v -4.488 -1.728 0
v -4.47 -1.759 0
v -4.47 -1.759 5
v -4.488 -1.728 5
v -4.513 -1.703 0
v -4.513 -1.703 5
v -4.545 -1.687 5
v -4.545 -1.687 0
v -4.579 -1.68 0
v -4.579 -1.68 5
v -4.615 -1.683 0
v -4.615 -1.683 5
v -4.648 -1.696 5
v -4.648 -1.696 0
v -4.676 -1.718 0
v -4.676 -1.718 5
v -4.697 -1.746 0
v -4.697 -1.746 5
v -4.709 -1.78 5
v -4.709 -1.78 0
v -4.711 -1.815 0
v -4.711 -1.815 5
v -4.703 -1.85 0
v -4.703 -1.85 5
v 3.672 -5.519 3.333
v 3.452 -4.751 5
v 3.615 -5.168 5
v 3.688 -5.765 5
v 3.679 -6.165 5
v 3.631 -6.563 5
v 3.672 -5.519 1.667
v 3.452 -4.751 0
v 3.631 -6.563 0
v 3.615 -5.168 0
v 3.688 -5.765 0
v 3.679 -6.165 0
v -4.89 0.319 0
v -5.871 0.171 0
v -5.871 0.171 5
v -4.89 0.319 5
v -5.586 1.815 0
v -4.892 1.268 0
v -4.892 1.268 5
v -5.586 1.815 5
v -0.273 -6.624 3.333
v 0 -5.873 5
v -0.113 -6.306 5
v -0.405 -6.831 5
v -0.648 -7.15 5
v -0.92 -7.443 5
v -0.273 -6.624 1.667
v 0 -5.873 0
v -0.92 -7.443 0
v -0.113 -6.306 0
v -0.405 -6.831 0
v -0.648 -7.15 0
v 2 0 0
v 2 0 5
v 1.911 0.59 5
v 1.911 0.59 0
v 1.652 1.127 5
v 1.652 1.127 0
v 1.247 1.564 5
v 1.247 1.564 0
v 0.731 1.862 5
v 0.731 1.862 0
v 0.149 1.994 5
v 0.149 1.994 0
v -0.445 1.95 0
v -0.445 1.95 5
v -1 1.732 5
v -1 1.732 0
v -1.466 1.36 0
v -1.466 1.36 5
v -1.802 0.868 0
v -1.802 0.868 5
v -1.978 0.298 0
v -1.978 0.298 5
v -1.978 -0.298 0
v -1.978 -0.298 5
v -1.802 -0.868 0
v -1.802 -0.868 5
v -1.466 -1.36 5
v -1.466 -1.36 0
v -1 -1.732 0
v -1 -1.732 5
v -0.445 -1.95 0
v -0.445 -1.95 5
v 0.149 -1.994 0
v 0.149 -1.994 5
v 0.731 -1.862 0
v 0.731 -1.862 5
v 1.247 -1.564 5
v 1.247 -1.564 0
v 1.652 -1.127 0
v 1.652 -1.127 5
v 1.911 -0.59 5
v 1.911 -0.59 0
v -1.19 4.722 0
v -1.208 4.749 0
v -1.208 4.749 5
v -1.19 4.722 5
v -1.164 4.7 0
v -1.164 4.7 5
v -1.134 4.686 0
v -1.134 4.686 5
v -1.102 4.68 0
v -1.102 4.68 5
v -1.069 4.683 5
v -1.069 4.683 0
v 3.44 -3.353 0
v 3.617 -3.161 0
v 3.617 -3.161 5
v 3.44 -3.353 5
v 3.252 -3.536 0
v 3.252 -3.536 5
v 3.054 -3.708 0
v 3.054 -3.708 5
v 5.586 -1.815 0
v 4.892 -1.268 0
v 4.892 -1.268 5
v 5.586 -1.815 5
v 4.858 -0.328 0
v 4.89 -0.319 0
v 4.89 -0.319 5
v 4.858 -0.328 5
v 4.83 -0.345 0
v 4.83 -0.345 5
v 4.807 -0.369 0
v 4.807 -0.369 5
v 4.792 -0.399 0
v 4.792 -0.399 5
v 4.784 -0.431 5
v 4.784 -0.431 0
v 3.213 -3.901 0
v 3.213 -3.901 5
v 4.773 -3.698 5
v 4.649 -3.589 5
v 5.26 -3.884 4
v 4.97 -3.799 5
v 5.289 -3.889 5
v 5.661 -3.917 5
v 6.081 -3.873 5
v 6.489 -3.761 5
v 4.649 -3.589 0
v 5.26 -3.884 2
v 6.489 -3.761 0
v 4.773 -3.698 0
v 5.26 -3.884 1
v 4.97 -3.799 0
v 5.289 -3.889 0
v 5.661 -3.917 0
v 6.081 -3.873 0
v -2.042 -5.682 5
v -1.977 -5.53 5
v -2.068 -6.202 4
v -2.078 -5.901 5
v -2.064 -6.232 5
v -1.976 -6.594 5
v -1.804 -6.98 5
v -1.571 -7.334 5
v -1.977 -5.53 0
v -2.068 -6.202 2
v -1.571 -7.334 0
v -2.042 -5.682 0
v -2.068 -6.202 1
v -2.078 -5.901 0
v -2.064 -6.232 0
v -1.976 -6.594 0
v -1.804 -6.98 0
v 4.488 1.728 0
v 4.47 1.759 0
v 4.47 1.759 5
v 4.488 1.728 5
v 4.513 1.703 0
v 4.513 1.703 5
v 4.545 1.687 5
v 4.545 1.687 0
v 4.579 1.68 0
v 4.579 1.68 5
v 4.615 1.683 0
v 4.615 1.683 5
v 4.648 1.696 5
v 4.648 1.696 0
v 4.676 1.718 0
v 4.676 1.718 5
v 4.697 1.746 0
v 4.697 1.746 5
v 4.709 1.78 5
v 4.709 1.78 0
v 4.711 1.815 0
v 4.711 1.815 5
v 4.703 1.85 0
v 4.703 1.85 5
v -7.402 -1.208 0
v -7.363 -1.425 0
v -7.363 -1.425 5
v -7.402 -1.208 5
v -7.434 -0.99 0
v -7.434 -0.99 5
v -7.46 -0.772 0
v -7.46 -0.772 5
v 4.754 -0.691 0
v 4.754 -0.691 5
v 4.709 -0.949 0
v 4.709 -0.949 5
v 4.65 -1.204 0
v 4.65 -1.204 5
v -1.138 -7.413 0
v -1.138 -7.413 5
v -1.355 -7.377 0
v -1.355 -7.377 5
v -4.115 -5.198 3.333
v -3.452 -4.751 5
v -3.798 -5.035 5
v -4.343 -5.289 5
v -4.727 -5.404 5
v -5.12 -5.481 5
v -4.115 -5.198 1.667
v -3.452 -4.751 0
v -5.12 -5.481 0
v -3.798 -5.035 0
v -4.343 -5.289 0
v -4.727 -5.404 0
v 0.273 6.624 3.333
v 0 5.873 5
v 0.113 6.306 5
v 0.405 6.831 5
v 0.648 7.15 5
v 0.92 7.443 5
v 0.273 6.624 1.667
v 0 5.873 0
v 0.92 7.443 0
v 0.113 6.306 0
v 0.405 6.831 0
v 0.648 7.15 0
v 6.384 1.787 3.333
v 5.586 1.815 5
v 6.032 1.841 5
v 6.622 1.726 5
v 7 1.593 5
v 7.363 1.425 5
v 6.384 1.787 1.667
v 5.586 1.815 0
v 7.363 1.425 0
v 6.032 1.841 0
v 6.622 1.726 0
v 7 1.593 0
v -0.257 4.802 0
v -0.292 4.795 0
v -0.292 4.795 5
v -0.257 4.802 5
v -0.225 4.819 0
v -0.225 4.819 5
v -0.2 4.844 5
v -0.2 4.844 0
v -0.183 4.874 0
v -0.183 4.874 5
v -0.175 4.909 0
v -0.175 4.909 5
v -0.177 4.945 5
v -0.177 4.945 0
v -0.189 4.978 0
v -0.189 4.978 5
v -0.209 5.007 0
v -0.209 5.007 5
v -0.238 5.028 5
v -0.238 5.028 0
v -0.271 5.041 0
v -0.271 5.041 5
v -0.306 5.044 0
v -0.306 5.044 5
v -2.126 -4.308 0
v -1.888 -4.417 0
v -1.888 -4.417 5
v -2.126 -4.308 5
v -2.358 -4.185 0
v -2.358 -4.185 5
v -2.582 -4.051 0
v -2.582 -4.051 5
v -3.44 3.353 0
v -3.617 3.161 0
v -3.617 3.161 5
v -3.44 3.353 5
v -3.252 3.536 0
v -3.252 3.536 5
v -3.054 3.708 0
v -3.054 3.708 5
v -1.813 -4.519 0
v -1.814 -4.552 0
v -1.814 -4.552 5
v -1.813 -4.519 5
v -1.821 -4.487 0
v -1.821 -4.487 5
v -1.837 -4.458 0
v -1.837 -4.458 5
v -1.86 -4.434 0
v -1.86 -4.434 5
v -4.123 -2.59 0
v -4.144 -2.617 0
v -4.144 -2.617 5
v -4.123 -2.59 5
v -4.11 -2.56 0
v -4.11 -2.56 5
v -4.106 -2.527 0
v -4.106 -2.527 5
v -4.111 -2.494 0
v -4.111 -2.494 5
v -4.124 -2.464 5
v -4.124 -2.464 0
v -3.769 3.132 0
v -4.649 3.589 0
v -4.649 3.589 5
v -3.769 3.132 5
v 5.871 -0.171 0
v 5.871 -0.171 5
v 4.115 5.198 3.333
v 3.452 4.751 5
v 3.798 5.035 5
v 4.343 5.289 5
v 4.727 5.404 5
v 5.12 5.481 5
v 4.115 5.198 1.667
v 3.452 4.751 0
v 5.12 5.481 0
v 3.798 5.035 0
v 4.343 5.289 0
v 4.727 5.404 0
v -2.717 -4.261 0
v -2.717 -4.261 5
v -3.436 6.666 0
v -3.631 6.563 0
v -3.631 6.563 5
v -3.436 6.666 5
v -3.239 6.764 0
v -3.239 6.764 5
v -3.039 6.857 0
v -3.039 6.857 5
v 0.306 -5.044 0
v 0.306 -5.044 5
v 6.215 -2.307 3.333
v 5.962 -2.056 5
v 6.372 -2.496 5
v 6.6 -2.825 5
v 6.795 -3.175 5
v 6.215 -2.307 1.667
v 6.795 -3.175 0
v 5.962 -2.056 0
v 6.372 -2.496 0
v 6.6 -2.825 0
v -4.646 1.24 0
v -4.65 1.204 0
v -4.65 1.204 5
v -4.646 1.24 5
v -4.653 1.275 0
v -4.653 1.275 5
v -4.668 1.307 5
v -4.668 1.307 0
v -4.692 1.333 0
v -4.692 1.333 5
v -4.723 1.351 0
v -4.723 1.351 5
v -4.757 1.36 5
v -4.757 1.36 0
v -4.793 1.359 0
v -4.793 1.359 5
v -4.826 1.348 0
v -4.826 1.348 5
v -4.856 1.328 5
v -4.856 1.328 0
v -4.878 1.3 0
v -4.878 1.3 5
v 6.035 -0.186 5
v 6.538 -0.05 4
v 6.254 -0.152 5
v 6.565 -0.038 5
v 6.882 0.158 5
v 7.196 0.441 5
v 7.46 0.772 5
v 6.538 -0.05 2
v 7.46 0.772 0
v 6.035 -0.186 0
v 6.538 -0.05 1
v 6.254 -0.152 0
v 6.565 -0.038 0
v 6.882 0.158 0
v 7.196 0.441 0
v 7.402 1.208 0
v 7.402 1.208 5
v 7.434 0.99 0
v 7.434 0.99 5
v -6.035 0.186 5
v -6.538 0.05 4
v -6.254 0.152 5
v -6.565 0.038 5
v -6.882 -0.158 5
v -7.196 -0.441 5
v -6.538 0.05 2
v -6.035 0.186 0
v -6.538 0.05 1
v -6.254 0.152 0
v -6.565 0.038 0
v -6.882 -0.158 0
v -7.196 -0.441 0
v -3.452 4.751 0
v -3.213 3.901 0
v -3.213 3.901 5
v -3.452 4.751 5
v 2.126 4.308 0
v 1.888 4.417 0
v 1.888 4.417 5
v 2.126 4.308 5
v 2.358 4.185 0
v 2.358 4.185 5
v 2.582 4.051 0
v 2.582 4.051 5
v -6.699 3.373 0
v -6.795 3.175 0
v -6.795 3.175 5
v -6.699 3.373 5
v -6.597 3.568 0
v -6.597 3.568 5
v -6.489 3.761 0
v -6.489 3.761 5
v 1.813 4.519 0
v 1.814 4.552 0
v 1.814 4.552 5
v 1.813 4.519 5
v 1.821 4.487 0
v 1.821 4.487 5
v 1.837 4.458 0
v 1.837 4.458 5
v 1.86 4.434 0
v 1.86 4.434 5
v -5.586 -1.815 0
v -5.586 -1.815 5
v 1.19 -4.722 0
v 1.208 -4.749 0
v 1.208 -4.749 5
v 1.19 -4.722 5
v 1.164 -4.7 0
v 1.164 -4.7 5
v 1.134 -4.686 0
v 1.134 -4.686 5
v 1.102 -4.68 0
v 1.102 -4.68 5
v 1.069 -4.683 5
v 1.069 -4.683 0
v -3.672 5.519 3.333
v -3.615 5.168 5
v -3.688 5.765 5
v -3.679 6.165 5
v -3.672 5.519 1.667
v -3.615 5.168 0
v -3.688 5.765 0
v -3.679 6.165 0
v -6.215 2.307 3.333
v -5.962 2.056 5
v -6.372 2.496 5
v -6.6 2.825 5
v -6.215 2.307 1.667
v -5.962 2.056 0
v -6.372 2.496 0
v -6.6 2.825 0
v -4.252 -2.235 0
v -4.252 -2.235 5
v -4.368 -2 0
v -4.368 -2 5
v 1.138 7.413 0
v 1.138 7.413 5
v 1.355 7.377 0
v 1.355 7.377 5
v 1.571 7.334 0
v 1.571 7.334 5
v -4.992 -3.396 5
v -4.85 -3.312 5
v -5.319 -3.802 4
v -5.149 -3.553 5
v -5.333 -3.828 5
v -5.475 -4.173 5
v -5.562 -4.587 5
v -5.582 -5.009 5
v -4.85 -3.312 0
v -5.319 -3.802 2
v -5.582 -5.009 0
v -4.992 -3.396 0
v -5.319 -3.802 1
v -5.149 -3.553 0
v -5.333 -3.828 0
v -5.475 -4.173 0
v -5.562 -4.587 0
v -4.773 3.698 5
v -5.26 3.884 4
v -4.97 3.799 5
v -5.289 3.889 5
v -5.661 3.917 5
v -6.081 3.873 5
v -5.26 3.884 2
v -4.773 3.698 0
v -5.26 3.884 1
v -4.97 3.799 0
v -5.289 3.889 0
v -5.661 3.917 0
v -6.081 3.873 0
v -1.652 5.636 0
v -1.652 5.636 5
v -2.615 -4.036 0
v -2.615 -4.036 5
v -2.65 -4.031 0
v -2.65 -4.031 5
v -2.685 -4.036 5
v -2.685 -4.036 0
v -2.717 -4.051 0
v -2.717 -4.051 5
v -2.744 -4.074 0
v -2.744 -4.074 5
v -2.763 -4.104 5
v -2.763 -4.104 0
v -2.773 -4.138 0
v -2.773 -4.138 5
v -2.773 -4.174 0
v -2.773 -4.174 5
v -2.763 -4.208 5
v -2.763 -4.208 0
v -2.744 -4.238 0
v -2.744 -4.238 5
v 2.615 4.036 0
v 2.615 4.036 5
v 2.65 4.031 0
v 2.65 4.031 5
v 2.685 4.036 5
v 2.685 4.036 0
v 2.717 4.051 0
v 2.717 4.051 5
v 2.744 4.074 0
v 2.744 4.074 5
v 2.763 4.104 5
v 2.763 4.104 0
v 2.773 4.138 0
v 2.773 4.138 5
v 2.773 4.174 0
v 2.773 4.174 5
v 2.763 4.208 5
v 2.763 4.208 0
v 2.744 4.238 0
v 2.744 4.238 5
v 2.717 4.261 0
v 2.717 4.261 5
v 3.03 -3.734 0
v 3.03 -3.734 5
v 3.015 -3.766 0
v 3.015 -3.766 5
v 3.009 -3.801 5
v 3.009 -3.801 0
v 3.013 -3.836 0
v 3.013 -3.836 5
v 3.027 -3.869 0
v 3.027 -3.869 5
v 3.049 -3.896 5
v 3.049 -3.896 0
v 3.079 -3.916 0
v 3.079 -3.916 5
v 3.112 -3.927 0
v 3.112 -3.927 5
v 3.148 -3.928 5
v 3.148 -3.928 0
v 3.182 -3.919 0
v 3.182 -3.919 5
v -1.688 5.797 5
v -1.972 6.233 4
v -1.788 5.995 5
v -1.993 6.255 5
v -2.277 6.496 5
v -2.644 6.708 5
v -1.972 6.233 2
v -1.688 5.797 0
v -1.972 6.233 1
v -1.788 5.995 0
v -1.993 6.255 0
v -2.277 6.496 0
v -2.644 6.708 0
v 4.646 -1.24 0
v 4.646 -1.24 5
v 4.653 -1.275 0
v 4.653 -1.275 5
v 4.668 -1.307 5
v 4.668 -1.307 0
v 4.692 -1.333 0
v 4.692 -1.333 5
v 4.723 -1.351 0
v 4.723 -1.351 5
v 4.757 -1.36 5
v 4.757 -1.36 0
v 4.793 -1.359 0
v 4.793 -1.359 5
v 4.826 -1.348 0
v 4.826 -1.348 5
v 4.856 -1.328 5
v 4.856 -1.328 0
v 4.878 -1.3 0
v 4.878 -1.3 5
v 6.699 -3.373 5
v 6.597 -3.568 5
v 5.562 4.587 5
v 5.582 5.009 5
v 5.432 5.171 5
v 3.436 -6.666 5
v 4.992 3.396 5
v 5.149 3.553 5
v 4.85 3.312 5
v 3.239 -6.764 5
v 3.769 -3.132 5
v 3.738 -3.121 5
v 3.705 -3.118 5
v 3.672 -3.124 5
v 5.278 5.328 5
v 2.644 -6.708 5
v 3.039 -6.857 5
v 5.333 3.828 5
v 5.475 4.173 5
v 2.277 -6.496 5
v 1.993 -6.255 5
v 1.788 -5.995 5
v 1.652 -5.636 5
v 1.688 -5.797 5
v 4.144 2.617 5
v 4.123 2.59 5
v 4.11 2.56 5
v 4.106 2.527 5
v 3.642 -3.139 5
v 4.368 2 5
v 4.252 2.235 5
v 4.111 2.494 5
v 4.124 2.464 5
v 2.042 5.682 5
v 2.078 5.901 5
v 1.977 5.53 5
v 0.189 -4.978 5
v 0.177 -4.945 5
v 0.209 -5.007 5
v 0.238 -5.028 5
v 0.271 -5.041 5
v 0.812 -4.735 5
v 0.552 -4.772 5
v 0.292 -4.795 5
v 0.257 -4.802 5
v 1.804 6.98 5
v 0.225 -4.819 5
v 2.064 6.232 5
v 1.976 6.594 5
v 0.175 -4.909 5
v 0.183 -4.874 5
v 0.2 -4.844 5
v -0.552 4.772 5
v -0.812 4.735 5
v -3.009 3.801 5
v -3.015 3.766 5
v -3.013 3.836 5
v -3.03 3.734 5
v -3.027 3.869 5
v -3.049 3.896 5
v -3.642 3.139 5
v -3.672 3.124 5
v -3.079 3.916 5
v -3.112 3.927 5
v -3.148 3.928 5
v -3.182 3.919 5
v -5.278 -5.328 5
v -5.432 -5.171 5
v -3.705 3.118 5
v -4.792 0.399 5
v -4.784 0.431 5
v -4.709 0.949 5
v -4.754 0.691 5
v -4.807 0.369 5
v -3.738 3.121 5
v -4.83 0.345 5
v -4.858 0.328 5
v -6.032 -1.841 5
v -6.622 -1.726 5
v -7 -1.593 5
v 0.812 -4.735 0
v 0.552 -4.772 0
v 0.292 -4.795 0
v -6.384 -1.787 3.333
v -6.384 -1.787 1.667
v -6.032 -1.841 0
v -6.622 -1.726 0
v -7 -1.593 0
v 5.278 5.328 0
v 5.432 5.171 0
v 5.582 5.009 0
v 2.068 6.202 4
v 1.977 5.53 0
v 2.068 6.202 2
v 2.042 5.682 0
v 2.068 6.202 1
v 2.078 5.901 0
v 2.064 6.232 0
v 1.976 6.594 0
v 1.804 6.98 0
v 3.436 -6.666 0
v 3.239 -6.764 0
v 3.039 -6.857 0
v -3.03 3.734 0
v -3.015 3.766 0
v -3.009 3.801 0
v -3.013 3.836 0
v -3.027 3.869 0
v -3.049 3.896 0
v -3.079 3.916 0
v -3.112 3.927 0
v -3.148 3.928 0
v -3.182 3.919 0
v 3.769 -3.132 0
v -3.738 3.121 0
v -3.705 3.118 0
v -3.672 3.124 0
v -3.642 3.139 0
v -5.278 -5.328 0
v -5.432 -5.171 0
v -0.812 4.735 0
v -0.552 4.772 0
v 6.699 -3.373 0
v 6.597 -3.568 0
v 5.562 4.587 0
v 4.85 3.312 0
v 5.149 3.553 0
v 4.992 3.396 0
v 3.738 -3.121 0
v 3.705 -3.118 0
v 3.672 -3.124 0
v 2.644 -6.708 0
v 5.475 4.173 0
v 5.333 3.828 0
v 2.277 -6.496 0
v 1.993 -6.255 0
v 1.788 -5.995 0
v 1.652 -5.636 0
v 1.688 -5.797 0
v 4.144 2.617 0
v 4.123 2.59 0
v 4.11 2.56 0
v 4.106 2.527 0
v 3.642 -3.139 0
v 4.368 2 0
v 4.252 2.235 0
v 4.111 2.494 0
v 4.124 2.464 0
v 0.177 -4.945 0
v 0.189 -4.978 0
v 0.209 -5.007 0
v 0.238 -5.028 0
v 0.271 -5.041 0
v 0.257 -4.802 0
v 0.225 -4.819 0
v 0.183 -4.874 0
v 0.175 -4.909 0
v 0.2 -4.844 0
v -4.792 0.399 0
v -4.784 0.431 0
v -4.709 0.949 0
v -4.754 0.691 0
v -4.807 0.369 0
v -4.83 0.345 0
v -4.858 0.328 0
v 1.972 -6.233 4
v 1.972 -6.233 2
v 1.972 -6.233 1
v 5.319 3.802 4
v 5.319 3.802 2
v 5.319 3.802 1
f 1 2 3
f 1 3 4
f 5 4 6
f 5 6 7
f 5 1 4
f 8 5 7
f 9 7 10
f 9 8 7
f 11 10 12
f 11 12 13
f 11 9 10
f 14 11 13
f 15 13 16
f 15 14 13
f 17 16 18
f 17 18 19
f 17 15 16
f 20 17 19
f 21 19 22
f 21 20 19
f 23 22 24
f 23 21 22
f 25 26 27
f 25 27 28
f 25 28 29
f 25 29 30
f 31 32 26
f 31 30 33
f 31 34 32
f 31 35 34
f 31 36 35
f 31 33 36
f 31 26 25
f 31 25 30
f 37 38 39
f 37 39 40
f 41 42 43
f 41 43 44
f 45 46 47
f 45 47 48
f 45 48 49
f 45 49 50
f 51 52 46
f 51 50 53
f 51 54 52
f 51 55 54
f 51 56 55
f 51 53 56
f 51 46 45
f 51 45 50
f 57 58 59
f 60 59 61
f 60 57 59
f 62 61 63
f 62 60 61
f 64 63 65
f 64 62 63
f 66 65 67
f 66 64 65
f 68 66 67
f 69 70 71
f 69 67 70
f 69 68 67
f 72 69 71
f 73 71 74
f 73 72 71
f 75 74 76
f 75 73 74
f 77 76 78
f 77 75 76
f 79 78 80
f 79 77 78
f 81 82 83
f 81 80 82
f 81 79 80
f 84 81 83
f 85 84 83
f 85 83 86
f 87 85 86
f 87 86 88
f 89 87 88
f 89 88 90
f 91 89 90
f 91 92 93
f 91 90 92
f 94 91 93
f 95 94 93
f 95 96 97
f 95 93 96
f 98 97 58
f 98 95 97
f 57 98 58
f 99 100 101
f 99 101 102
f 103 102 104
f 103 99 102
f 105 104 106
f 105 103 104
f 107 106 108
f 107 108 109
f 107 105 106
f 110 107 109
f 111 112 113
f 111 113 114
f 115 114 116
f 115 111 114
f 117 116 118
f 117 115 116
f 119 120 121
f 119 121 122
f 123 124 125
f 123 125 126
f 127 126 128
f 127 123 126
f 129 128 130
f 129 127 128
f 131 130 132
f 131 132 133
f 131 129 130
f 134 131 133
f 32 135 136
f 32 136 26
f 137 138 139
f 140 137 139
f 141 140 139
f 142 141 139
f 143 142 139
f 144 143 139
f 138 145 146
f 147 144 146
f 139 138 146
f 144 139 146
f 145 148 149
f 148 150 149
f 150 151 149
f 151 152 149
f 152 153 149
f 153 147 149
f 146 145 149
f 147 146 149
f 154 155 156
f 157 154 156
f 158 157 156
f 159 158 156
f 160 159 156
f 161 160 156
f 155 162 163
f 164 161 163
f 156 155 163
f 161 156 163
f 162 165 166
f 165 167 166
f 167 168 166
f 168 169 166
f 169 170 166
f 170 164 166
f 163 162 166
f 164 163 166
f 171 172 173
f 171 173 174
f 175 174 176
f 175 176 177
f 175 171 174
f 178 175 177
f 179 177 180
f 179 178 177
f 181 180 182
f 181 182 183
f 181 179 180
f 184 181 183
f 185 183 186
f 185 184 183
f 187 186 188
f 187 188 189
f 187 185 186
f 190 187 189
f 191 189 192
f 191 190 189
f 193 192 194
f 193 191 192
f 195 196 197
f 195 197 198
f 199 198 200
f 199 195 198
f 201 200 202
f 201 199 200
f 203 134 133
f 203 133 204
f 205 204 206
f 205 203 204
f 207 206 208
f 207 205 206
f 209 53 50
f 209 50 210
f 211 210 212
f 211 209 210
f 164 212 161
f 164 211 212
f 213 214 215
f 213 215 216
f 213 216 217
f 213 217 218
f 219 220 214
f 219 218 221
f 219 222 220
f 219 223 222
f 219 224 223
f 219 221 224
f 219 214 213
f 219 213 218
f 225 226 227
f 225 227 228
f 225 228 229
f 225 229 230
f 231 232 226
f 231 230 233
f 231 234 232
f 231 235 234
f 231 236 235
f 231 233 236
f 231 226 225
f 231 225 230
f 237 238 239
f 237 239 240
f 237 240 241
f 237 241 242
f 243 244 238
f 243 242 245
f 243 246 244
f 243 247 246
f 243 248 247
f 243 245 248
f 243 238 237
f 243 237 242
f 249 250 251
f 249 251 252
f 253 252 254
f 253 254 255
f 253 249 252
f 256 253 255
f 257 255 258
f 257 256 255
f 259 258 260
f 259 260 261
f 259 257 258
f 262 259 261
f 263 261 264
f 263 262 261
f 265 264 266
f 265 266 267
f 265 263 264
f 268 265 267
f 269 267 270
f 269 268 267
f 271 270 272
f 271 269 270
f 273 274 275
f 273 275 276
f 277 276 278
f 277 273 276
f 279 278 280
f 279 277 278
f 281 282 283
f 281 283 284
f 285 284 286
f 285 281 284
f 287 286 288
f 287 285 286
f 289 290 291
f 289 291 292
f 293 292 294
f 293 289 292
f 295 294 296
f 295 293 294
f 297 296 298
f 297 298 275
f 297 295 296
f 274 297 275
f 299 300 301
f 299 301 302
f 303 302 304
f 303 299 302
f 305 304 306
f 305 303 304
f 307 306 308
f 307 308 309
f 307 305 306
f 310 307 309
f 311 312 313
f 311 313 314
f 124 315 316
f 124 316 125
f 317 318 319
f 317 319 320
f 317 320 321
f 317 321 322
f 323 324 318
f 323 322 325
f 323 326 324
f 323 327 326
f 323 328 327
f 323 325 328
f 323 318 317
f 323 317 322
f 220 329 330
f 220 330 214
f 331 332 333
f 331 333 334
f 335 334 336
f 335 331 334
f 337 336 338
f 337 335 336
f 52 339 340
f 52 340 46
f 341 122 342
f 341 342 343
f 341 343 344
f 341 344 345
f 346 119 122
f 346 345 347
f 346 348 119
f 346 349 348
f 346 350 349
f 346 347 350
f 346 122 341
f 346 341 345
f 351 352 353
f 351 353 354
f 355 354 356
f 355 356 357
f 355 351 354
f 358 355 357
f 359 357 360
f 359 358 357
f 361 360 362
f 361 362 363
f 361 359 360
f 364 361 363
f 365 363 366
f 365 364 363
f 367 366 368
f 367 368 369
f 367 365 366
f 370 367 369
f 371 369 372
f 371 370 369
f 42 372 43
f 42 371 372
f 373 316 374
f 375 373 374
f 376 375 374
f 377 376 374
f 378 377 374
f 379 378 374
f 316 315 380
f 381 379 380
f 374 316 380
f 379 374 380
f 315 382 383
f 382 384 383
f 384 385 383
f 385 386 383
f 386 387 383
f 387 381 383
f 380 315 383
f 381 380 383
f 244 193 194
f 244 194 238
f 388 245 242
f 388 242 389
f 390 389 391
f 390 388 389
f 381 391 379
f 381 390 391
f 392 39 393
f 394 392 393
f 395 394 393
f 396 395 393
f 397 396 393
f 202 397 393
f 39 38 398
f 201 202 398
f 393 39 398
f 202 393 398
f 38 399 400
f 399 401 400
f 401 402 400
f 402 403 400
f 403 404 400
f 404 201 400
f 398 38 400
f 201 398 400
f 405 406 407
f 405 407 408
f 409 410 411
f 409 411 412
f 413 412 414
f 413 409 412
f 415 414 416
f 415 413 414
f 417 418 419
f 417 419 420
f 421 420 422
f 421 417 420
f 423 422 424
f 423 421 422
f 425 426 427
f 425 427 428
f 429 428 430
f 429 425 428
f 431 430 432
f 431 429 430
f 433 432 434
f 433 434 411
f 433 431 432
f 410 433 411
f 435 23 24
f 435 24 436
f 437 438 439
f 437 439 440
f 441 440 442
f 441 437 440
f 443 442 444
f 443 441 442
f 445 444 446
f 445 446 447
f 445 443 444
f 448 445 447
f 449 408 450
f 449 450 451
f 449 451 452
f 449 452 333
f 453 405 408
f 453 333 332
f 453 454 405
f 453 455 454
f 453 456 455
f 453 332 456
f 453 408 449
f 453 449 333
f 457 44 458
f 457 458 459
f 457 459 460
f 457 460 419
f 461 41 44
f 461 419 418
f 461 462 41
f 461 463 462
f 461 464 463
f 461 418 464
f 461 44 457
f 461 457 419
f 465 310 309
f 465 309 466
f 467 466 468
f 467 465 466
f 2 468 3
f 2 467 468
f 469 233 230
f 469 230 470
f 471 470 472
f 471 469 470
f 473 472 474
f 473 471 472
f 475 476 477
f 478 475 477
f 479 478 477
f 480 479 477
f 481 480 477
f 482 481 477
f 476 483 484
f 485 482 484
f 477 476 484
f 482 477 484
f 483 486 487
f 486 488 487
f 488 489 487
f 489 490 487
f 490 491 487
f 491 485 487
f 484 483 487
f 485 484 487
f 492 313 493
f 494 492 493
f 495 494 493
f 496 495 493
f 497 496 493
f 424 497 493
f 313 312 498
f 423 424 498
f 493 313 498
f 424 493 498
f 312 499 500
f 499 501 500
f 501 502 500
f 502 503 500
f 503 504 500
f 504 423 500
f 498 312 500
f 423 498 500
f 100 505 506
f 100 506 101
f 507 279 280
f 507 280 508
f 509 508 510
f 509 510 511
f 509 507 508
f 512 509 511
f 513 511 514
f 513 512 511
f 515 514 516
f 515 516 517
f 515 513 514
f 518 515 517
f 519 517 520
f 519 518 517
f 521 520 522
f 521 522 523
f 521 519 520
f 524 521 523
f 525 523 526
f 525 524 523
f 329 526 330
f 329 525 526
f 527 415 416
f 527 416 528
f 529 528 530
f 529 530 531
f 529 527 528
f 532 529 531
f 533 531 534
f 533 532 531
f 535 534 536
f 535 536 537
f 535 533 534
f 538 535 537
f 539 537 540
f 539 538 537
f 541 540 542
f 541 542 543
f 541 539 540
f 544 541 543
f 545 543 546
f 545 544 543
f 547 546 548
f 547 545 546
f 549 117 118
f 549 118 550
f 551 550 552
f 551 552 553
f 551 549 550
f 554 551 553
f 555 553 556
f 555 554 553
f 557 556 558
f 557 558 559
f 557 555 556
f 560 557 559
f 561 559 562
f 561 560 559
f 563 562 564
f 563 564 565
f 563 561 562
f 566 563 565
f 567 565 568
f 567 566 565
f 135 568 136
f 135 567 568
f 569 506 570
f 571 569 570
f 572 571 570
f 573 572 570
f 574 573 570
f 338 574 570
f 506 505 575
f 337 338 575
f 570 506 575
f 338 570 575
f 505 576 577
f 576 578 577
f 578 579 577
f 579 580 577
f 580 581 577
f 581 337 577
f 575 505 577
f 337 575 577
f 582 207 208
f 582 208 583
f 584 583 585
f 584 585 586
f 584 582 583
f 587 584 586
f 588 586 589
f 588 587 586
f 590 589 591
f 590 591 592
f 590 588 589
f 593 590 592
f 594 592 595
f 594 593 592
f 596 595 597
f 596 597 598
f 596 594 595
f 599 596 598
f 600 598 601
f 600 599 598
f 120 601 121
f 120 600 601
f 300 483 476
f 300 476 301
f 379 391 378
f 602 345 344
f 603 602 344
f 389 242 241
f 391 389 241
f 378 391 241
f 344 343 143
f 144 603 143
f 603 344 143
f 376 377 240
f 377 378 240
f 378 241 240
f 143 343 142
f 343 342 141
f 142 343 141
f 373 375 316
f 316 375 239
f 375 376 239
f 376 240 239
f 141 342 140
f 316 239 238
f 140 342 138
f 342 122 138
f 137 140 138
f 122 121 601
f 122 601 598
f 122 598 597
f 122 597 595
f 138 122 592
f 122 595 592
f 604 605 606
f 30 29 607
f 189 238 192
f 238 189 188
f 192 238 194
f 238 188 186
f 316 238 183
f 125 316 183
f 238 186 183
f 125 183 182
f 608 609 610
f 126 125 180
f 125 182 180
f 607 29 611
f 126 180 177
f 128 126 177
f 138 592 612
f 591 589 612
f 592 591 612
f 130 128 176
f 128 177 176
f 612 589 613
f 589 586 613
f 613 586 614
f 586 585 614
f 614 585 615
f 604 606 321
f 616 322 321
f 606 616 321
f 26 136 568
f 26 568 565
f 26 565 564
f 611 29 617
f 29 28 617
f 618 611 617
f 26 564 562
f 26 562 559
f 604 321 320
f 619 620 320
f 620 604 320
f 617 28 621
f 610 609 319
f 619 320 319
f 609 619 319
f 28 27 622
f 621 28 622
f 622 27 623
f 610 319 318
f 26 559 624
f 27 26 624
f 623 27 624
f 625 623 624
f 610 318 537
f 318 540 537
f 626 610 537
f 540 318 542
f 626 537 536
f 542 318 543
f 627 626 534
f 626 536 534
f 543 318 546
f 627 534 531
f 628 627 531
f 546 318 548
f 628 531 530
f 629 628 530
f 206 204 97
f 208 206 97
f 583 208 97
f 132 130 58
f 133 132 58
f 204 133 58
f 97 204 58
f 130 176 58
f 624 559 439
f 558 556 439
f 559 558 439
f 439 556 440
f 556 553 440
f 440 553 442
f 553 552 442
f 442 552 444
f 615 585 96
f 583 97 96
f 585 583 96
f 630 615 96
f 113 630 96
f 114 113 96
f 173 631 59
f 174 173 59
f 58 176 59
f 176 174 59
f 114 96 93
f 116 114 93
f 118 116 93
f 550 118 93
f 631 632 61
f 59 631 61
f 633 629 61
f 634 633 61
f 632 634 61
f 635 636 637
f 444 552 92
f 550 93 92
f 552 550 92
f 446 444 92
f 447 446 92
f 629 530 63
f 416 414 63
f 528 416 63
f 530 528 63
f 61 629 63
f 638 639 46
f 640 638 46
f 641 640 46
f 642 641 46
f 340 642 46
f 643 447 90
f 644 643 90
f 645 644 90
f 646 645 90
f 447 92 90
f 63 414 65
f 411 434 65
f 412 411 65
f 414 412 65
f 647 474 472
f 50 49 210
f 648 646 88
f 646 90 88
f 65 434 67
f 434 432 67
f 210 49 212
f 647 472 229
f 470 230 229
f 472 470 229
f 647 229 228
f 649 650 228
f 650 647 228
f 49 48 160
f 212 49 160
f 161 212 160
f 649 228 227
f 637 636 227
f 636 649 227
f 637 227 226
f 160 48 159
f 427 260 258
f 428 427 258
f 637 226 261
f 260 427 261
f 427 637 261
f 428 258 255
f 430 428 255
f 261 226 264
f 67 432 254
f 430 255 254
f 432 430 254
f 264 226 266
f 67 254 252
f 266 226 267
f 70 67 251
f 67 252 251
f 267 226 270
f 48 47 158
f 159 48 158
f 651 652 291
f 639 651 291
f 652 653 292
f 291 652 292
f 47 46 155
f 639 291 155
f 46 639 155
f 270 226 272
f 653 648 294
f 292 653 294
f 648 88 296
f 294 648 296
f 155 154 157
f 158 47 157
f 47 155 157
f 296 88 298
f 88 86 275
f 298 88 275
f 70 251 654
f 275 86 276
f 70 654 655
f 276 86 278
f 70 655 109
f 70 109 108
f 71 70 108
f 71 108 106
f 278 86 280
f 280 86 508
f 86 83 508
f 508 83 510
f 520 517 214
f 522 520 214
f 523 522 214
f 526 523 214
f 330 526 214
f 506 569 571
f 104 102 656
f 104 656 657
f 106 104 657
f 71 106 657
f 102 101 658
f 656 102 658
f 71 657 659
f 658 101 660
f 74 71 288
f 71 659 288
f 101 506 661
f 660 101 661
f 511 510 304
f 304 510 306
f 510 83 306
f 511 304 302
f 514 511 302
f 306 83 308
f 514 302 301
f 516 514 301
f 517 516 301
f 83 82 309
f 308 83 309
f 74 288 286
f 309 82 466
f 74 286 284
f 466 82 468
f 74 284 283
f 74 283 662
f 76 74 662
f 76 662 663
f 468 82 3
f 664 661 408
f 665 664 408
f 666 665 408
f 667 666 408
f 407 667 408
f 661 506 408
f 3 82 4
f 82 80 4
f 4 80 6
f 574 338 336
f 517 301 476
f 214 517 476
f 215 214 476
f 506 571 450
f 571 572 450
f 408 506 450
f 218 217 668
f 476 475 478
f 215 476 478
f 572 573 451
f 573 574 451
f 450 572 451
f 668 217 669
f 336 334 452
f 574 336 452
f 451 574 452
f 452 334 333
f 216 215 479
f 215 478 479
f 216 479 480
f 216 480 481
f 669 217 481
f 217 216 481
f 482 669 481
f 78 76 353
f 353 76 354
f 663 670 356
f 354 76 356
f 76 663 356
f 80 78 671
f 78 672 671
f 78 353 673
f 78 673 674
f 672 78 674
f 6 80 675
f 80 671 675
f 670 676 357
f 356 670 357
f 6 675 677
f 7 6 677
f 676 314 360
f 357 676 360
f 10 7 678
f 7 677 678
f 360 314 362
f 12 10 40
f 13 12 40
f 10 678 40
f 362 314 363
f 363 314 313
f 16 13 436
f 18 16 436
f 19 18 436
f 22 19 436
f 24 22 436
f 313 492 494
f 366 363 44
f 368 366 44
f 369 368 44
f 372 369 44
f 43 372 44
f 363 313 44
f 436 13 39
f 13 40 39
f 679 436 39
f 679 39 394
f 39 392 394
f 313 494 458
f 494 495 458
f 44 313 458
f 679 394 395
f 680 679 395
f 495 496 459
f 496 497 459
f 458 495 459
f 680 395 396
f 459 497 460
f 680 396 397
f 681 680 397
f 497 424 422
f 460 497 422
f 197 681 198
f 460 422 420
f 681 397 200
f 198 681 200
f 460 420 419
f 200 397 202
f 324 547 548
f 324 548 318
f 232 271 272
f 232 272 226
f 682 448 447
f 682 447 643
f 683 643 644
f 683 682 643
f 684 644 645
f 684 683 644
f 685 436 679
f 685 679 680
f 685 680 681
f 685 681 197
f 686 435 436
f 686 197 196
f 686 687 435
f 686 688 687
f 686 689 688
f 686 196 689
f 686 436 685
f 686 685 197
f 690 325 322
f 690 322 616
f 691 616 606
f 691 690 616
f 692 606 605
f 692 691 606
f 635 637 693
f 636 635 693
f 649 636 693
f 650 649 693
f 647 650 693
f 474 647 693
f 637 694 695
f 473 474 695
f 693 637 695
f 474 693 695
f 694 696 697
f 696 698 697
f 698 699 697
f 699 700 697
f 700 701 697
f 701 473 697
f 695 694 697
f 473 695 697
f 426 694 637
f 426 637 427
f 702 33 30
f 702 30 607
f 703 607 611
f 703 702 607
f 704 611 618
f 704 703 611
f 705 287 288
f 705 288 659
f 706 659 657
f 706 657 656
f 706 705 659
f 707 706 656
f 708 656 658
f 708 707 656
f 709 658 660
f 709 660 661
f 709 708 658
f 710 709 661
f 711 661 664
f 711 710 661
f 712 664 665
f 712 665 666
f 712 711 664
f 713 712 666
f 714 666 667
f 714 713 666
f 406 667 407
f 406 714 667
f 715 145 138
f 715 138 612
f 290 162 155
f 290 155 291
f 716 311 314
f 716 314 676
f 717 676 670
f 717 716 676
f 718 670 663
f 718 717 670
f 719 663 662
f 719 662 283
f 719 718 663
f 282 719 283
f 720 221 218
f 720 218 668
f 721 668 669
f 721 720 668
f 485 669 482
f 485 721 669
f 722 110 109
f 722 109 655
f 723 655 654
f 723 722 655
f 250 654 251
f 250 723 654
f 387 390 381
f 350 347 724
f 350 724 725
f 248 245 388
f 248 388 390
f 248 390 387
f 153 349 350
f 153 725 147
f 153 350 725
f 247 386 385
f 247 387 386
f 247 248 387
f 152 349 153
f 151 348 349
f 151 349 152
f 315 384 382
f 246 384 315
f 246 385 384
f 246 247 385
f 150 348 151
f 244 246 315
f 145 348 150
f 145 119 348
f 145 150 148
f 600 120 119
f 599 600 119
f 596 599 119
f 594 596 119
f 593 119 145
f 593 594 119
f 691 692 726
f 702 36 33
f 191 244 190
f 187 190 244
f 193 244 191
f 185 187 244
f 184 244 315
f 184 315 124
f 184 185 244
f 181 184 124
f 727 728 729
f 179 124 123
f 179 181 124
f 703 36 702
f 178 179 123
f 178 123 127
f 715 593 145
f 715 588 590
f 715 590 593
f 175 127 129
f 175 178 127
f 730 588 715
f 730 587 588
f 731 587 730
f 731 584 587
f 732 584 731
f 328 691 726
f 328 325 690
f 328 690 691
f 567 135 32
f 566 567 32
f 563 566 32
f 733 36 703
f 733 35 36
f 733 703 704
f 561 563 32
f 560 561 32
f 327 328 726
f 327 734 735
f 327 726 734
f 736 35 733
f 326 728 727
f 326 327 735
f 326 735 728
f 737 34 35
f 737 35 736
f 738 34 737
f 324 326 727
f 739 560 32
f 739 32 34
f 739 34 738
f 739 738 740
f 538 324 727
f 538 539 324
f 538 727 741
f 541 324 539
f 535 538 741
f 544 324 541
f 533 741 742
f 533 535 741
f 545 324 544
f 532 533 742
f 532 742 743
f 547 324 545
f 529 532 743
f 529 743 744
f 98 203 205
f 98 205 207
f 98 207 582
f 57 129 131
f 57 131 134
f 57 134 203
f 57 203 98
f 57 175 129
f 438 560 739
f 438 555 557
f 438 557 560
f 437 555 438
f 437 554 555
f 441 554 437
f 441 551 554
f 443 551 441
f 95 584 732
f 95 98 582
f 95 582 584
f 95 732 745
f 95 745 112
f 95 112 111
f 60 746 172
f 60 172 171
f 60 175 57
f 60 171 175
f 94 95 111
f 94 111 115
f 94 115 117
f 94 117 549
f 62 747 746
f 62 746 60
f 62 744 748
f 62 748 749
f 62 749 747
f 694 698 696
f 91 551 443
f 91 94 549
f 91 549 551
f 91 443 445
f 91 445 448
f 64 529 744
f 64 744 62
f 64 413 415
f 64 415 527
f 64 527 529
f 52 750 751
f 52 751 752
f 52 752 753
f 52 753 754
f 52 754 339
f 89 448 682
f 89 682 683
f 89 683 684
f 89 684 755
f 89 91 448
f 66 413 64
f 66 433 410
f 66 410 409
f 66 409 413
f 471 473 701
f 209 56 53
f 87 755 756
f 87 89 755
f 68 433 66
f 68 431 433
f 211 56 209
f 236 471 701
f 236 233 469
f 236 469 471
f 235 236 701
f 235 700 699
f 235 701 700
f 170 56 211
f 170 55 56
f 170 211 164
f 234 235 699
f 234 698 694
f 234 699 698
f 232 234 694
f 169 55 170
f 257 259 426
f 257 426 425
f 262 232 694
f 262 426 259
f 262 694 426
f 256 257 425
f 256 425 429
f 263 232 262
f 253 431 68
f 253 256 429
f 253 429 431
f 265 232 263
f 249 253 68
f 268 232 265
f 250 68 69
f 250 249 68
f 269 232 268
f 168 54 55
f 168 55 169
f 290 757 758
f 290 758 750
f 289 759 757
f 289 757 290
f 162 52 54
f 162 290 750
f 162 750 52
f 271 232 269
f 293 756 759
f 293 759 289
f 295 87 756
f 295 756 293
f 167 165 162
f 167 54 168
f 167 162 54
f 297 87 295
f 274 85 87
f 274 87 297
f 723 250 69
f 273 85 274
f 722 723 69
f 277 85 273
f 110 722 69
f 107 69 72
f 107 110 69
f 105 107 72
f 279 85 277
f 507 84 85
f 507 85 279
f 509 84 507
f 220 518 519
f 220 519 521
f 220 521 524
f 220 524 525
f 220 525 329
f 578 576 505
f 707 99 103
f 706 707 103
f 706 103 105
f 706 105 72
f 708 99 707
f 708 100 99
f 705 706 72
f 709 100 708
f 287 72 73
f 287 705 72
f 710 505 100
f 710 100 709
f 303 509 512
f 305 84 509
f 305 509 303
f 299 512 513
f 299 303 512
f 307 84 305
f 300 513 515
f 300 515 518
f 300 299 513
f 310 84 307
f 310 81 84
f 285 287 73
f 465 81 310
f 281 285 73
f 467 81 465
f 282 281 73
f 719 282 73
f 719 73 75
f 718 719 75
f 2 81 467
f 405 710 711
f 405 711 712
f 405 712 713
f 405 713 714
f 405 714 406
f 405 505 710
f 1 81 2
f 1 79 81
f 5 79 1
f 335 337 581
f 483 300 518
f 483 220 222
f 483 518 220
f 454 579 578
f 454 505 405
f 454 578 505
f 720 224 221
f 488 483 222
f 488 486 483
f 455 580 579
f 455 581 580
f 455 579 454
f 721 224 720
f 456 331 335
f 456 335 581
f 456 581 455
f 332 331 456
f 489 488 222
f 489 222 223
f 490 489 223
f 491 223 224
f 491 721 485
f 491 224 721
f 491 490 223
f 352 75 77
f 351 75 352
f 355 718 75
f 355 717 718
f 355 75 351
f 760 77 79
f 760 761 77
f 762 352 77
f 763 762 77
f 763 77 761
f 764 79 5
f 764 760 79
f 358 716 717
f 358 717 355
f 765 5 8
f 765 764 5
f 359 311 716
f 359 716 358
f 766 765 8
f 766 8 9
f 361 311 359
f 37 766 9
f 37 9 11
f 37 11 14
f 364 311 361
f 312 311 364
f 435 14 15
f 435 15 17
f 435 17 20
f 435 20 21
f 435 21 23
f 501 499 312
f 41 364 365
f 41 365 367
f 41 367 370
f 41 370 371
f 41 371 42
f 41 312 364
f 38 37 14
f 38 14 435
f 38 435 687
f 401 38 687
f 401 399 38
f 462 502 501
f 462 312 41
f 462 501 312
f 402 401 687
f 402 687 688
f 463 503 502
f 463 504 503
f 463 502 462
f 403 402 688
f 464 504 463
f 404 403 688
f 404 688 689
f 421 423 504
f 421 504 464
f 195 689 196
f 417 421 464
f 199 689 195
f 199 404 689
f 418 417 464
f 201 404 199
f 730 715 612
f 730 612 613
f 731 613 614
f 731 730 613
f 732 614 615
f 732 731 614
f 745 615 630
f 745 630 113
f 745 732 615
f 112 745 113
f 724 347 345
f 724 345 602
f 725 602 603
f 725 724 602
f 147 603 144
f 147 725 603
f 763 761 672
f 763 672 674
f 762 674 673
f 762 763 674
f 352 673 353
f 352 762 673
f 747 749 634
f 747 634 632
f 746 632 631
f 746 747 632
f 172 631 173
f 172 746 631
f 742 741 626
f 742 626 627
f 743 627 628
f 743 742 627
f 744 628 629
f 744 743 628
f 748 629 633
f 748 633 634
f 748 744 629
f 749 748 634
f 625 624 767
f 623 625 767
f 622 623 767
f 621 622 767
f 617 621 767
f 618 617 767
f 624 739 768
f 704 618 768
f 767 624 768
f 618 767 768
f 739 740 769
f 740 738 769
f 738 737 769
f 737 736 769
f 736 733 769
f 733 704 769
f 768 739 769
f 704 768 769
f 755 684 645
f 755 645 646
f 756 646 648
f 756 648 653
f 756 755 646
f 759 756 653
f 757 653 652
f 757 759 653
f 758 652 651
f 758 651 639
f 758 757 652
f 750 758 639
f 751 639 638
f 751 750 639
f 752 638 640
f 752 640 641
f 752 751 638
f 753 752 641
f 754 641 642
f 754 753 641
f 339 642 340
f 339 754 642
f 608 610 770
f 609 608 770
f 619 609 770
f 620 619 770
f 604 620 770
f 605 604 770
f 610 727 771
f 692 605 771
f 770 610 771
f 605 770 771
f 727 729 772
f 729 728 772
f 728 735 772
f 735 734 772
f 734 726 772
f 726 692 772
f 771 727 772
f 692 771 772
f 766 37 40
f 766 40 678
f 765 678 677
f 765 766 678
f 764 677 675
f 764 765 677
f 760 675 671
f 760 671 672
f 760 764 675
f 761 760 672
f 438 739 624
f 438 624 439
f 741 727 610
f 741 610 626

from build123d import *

# Parameters (mm, degrees)
CROQUIS2_R              = 2
SALIENTE_EXTRUIR1_DEPTH = 5
MATRIZC6_COUNT          = 10


with BuildPart() as part:
    # Croquis2 → Saliente-Extruir1 (new body)
    with BuildSketch(Plane.XY):
        with BuildLine():
            Line((-0.306026412, 5.044473868), (0, 5.87307888))
            add(Edge.make_bspline(
                [(0, 5.87307888), (0.02679779, 6.141175495), (0.274936867, 6.703868053), (0.663188036, 7.188067029), (0.910477928, 7.4337912), (0.9201705, 7.443338381)],
                knots=[0, 0, 0, 0, 0.049397205, 0.111126444, 0.113633344, 0.113633344, 0.113633344, 0.113633344], degree=3))
            ThreePointArc((0.9201705, 7.443338381), (1.246914914, 7.395620542), (1.571242221, 7.333566519))
            add(Edge.make_bspline(
                [(1.976598848, 5.530471275), (2.031114418, 5.617400913), (2.087789883, 5.844644836), (2.081168958, 6.255490925), (1.933755754, 6.776716333), (1.720527283, 7.138546833), (1.576032848, 7.327357984), (1.571242221, 7.333566519)],
                knots=[0, 0, 0, 0, 0.049397205, 0.111126444, 0.197545762, 0.30865546, 0.312445362, 0.312445362, 0.312445362, 0.312445362], degree=3))
            Line((1.976598848, 5.530471275), (1.814118887, 4.552477655))
            ThreePointArc((1.814118887, 4.552477655), (1.827796208, 4.471943871), (1.888292818, 4.417053803))
            ThreePointArc((1.888292818, 4.417053803), (-0.82041007, -4.733174556), (-0.291568658, 4.794893302))
            ThreePointArc((-0.291568658, 4.794893302), (-0.174364868, 4.926891746), (-0.306026412, 5.044473868))
        make_face()
        Circle(CROQUIS2_R, mode=Mode.SUBTRACT)
    saliente_extruir1 = extrude(amount=SALIENTE_EXTRUIR1_DEPTH)

    # MatrizC6: Saliente-Extruir1 ×10 about axis
    matrizc6_axis = Axis((0, 0, 5), (0, 0, -1))
    for i in range(1, MATRIZC6_COUNT):
        add(saliente_extruir1.rotate(matrizc6_axis, i * 360 / MATRIZC6_COUNT))


solid = part.part
